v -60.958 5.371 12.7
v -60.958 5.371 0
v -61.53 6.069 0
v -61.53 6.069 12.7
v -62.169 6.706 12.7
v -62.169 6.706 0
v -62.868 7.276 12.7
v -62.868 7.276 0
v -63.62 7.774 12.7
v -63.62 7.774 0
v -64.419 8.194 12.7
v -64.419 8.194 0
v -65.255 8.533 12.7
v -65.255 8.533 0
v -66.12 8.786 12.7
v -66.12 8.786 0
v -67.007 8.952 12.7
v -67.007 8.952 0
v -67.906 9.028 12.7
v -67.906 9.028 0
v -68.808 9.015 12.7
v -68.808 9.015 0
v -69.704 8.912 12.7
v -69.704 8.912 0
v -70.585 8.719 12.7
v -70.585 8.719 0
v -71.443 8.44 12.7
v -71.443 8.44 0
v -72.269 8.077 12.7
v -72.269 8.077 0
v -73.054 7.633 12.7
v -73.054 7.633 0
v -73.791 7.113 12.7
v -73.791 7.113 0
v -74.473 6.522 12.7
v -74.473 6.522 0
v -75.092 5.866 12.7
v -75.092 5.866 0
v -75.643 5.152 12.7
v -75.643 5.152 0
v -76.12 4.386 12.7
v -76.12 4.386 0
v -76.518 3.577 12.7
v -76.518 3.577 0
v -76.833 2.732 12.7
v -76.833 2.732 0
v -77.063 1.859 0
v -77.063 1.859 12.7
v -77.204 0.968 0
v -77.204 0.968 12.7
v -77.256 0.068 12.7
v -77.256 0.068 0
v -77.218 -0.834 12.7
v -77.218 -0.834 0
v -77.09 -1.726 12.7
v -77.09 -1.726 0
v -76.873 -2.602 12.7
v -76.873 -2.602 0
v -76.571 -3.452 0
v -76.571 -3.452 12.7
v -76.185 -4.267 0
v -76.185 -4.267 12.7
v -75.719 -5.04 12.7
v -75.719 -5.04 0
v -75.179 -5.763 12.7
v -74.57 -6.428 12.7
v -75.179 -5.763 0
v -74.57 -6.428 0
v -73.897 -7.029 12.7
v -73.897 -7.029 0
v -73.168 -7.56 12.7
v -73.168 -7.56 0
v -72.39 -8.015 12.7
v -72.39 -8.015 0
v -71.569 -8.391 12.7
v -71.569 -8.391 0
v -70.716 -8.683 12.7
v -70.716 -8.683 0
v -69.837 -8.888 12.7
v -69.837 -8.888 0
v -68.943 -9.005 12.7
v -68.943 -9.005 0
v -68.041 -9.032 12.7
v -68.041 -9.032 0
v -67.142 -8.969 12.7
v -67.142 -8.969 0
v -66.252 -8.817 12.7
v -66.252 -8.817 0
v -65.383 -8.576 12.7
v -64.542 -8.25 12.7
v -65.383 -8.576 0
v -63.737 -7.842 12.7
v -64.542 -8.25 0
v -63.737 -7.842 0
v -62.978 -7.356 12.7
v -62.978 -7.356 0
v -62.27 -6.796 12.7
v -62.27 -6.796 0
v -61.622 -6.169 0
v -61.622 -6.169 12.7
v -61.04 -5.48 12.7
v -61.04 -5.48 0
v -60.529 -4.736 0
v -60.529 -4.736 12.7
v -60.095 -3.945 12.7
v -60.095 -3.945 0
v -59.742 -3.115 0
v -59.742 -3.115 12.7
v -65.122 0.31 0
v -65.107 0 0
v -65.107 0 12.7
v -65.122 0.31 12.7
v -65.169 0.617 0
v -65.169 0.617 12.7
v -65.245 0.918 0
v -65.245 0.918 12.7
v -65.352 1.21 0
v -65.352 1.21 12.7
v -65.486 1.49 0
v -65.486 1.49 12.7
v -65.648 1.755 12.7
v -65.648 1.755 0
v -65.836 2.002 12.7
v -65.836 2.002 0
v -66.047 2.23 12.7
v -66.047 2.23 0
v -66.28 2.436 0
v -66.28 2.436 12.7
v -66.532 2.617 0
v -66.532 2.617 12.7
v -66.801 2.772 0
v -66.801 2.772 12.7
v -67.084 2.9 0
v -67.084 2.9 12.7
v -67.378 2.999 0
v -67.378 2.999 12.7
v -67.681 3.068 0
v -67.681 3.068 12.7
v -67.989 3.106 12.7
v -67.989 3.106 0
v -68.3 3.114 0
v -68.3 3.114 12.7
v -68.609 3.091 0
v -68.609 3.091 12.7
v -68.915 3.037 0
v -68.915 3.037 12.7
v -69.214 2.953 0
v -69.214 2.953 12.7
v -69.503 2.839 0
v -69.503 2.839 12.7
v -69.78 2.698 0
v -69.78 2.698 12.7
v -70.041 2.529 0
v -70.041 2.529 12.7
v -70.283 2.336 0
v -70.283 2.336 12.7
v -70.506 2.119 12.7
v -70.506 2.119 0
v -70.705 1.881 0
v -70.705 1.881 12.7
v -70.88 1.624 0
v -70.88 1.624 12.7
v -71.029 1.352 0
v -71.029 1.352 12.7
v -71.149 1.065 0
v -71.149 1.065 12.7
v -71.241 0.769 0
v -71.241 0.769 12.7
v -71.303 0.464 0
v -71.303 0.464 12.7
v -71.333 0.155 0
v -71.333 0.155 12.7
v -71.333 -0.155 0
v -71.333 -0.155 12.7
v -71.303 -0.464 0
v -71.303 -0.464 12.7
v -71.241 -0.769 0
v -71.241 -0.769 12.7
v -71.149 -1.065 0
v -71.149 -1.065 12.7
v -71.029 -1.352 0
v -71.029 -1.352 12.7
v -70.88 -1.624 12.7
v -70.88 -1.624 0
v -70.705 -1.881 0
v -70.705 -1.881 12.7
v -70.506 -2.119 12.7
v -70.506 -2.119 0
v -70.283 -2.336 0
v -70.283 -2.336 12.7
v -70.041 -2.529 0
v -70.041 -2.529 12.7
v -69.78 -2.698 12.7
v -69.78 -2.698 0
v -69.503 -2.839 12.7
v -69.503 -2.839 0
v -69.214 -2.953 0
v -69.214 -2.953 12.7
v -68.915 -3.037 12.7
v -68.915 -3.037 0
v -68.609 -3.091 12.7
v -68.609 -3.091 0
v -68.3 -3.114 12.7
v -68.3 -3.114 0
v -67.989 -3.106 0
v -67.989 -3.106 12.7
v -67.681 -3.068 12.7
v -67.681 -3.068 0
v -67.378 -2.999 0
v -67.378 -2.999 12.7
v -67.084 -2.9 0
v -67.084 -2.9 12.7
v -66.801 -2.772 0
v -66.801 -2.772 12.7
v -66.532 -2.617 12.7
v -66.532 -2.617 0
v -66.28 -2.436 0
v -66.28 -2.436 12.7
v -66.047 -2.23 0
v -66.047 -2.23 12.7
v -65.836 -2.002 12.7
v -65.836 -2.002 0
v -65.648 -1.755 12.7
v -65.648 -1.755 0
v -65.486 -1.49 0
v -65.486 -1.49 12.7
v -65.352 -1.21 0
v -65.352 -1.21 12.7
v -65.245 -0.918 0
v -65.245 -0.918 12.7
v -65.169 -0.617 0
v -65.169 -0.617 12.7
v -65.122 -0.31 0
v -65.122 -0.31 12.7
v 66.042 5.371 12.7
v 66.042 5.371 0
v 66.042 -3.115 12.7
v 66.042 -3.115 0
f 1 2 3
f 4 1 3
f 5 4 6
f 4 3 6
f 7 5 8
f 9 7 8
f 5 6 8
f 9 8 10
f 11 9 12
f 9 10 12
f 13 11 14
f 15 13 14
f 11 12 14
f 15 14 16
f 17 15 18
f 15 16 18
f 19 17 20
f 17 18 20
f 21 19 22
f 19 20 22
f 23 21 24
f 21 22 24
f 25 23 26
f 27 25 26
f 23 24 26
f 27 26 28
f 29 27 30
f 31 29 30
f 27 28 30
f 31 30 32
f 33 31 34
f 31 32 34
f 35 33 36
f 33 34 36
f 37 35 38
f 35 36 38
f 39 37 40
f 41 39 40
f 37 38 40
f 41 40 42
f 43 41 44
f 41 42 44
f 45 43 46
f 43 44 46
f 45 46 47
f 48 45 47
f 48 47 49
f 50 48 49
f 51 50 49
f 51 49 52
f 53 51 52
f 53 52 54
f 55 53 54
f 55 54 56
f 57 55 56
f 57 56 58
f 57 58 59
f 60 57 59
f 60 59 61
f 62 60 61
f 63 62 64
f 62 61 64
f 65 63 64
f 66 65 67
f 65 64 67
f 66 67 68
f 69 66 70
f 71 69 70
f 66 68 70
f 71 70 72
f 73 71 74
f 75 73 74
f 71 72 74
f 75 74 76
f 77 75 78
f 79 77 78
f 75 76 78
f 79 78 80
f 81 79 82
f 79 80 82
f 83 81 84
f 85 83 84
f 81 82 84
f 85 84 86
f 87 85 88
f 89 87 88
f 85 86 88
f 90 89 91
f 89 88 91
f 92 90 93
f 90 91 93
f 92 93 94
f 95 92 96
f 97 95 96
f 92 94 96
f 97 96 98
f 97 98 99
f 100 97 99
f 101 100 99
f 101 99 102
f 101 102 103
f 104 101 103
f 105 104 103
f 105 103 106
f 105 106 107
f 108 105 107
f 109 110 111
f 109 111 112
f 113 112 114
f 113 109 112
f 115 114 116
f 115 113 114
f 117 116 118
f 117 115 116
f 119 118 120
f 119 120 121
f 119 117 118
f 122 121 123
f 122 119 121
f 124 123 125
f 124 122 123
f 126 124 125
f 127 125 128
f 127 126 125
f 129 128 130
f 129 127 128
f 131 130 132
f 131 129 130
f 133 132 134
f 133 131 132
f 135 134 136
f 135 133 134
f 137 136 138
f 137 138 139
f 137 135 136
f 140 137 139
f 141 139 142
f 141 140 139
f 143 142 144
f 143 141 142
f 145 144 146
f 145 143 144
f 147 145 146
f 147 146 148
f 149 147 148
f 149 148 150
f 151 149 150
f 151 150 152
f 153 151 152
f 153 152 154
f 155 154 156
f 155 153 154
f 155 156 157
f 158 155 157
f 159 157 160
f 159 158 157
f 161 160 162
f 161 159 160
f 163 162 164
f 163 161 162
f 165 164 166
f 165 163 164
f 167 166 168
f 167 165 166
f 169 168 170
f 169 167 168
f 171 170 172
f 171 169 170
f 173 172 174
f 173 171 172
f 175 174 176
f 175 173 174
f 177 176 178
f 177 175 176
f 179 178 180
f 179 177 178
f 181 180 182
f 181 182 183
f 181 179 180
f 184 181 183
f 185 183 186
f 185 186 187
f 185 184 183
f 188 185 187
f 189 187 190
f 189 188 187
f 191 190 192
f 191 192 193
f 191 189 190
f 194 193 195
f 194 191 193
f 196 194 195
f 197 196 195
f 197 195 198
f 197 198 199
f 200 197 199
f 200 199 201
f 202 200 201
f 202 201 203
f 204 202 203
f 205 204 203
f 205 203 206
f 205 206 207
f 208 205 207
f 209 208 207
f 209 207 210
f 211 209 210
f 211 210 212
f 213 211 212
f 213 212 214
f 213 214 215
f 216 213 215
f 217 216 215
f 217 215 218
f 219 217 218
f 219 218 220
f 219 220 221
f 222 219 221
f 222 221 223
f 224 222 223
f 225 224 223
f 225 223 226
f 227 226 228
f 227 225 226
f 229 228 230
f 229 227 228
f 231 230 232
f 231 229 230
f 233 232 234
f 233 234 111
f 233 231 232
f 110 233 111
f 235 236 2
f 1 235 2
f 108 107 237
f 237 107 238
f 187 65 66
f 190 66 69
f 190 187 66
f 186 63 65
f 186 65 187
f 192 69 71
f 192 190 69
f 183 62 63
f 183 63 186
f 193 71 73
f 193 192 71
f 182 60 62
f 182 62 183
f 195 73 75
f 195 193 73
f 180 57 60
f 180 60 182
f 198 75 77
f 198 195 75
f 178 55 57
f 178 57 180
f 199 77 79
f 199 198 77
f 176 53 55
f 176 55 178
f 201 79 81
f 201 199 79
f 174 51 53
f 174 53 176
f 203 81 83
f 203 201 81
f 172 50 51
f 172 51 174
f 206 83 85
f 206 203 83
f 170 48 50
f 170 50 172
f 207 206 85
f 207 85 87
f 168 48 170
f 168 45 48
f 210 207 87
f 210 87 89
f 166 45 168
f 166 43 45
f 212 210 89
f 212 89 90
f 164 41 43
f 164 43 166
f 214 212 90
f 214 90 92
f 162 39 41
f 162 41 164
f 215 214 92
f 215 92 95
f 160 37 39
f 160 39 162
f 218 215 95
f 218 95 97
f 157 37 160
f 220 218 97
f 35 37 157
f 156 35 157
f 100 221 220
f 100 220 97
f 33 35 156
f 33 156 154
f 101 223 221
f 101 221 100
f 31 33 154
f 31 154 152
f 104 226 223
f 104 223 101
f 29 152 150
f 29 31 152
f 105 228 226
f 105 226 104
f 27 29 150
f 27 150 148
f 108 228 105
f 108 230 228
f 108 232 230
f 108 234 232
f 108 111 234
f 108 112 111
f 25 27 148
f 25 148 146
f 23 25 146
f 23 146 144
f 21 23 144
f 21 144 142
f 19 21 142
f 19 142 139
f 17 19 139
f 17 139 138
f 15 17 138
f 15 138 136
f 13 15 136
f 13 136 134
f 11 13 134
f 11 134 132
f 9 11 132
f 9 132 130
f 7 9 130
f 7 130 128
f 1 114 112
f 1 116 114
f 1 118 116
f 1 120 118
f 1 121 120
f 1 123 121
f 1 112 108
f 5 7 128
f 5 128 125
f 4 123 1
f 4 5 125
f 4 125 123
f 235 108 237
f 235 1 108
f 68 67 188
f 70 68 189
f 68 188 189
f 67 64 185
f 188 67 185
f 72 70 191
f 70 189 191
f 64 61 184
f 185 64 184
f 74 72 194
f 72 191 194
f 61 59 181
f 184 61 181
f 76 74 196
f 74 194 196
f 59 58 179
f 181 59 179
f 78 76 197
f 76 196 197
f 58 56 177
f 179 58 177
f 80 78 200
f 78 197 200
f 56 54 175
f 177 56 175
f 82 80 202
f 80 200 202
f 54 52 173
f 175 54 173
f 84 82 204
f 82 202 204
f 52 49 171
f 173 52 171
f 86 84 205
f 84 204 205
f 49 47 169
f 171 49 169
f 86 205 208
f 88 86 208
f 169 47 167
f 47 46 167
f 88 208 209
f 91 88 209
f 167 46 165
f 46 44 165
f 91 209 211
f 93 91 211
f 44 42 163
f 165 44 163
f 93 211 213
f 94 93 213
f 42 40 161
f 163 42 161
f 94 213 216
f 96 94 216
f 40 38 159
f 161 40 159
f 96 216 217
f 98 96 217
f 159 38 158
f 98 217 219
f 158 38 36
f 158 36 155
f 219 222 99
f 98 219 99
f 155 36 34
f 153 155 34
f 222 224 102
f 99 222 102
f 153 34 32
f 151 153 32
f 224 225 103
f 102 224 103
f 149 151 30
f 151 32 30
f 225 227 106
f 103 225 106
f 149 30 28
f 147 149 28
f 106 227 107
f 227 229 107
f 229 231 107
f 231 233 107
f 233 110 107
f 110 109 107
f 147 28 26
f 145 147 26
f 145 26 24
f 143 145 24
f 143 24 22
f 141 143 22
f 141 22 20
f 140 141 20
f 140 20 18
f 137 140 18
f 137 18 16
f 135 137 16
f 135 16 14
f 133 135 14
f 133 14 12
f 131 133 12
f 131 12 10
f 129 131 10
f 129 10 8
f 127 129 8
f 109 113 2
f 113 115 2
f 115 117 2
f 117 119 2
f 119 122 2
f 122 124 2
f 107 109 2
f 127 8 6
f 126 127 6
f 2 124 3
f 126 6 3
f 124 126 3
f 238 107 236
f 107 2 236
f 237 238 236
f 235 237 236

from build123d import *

# Parameters (mm, degrees)
F0_R     = 3.115166
F1_DEPTH = 12.7


with BuildPart() as f1:
    # F0 (on Top) → F1 (new body)
    with BuildSketch(Plane.XY):
        with BuildLine():
            ThreePointArc((-59.742244, -3.115166), (-59.327755, -1.58203), (-59.188154, 0))
            ThreePointArc((-59.188154, 0), (-59.642142, 2.827817), (-60.95848, 5.371418))
            ThreePointArc((-60.95848, 5.371418), (-77.164752, -1.281591), (-59.742244, -3.115166))
        make_face()
        with Locations((-68.222136, 0)):
            Circle(F0_R, mode=Mode.SUBTRACT)
        with BuildLine():
            ThreePointArc((-60.95848, 5.371418), (-59.642142, 2.827817), (-59.188154, 0))
            ThreePointArc((-59.188154, 0), (-59.327755, -1.58203), (-59.742244, -3.115166))
            Line((-59.742244, -3.115166), (66.04152, -3.115166))
            Line((66.04152, -3.115166), (66.04152, 5.371418))
            Line((66.04152, 5.371418), (-60.95848, 5.371418))
        make_face()
    extrude(amount=F1_DEPTH)


solid = f1.part
